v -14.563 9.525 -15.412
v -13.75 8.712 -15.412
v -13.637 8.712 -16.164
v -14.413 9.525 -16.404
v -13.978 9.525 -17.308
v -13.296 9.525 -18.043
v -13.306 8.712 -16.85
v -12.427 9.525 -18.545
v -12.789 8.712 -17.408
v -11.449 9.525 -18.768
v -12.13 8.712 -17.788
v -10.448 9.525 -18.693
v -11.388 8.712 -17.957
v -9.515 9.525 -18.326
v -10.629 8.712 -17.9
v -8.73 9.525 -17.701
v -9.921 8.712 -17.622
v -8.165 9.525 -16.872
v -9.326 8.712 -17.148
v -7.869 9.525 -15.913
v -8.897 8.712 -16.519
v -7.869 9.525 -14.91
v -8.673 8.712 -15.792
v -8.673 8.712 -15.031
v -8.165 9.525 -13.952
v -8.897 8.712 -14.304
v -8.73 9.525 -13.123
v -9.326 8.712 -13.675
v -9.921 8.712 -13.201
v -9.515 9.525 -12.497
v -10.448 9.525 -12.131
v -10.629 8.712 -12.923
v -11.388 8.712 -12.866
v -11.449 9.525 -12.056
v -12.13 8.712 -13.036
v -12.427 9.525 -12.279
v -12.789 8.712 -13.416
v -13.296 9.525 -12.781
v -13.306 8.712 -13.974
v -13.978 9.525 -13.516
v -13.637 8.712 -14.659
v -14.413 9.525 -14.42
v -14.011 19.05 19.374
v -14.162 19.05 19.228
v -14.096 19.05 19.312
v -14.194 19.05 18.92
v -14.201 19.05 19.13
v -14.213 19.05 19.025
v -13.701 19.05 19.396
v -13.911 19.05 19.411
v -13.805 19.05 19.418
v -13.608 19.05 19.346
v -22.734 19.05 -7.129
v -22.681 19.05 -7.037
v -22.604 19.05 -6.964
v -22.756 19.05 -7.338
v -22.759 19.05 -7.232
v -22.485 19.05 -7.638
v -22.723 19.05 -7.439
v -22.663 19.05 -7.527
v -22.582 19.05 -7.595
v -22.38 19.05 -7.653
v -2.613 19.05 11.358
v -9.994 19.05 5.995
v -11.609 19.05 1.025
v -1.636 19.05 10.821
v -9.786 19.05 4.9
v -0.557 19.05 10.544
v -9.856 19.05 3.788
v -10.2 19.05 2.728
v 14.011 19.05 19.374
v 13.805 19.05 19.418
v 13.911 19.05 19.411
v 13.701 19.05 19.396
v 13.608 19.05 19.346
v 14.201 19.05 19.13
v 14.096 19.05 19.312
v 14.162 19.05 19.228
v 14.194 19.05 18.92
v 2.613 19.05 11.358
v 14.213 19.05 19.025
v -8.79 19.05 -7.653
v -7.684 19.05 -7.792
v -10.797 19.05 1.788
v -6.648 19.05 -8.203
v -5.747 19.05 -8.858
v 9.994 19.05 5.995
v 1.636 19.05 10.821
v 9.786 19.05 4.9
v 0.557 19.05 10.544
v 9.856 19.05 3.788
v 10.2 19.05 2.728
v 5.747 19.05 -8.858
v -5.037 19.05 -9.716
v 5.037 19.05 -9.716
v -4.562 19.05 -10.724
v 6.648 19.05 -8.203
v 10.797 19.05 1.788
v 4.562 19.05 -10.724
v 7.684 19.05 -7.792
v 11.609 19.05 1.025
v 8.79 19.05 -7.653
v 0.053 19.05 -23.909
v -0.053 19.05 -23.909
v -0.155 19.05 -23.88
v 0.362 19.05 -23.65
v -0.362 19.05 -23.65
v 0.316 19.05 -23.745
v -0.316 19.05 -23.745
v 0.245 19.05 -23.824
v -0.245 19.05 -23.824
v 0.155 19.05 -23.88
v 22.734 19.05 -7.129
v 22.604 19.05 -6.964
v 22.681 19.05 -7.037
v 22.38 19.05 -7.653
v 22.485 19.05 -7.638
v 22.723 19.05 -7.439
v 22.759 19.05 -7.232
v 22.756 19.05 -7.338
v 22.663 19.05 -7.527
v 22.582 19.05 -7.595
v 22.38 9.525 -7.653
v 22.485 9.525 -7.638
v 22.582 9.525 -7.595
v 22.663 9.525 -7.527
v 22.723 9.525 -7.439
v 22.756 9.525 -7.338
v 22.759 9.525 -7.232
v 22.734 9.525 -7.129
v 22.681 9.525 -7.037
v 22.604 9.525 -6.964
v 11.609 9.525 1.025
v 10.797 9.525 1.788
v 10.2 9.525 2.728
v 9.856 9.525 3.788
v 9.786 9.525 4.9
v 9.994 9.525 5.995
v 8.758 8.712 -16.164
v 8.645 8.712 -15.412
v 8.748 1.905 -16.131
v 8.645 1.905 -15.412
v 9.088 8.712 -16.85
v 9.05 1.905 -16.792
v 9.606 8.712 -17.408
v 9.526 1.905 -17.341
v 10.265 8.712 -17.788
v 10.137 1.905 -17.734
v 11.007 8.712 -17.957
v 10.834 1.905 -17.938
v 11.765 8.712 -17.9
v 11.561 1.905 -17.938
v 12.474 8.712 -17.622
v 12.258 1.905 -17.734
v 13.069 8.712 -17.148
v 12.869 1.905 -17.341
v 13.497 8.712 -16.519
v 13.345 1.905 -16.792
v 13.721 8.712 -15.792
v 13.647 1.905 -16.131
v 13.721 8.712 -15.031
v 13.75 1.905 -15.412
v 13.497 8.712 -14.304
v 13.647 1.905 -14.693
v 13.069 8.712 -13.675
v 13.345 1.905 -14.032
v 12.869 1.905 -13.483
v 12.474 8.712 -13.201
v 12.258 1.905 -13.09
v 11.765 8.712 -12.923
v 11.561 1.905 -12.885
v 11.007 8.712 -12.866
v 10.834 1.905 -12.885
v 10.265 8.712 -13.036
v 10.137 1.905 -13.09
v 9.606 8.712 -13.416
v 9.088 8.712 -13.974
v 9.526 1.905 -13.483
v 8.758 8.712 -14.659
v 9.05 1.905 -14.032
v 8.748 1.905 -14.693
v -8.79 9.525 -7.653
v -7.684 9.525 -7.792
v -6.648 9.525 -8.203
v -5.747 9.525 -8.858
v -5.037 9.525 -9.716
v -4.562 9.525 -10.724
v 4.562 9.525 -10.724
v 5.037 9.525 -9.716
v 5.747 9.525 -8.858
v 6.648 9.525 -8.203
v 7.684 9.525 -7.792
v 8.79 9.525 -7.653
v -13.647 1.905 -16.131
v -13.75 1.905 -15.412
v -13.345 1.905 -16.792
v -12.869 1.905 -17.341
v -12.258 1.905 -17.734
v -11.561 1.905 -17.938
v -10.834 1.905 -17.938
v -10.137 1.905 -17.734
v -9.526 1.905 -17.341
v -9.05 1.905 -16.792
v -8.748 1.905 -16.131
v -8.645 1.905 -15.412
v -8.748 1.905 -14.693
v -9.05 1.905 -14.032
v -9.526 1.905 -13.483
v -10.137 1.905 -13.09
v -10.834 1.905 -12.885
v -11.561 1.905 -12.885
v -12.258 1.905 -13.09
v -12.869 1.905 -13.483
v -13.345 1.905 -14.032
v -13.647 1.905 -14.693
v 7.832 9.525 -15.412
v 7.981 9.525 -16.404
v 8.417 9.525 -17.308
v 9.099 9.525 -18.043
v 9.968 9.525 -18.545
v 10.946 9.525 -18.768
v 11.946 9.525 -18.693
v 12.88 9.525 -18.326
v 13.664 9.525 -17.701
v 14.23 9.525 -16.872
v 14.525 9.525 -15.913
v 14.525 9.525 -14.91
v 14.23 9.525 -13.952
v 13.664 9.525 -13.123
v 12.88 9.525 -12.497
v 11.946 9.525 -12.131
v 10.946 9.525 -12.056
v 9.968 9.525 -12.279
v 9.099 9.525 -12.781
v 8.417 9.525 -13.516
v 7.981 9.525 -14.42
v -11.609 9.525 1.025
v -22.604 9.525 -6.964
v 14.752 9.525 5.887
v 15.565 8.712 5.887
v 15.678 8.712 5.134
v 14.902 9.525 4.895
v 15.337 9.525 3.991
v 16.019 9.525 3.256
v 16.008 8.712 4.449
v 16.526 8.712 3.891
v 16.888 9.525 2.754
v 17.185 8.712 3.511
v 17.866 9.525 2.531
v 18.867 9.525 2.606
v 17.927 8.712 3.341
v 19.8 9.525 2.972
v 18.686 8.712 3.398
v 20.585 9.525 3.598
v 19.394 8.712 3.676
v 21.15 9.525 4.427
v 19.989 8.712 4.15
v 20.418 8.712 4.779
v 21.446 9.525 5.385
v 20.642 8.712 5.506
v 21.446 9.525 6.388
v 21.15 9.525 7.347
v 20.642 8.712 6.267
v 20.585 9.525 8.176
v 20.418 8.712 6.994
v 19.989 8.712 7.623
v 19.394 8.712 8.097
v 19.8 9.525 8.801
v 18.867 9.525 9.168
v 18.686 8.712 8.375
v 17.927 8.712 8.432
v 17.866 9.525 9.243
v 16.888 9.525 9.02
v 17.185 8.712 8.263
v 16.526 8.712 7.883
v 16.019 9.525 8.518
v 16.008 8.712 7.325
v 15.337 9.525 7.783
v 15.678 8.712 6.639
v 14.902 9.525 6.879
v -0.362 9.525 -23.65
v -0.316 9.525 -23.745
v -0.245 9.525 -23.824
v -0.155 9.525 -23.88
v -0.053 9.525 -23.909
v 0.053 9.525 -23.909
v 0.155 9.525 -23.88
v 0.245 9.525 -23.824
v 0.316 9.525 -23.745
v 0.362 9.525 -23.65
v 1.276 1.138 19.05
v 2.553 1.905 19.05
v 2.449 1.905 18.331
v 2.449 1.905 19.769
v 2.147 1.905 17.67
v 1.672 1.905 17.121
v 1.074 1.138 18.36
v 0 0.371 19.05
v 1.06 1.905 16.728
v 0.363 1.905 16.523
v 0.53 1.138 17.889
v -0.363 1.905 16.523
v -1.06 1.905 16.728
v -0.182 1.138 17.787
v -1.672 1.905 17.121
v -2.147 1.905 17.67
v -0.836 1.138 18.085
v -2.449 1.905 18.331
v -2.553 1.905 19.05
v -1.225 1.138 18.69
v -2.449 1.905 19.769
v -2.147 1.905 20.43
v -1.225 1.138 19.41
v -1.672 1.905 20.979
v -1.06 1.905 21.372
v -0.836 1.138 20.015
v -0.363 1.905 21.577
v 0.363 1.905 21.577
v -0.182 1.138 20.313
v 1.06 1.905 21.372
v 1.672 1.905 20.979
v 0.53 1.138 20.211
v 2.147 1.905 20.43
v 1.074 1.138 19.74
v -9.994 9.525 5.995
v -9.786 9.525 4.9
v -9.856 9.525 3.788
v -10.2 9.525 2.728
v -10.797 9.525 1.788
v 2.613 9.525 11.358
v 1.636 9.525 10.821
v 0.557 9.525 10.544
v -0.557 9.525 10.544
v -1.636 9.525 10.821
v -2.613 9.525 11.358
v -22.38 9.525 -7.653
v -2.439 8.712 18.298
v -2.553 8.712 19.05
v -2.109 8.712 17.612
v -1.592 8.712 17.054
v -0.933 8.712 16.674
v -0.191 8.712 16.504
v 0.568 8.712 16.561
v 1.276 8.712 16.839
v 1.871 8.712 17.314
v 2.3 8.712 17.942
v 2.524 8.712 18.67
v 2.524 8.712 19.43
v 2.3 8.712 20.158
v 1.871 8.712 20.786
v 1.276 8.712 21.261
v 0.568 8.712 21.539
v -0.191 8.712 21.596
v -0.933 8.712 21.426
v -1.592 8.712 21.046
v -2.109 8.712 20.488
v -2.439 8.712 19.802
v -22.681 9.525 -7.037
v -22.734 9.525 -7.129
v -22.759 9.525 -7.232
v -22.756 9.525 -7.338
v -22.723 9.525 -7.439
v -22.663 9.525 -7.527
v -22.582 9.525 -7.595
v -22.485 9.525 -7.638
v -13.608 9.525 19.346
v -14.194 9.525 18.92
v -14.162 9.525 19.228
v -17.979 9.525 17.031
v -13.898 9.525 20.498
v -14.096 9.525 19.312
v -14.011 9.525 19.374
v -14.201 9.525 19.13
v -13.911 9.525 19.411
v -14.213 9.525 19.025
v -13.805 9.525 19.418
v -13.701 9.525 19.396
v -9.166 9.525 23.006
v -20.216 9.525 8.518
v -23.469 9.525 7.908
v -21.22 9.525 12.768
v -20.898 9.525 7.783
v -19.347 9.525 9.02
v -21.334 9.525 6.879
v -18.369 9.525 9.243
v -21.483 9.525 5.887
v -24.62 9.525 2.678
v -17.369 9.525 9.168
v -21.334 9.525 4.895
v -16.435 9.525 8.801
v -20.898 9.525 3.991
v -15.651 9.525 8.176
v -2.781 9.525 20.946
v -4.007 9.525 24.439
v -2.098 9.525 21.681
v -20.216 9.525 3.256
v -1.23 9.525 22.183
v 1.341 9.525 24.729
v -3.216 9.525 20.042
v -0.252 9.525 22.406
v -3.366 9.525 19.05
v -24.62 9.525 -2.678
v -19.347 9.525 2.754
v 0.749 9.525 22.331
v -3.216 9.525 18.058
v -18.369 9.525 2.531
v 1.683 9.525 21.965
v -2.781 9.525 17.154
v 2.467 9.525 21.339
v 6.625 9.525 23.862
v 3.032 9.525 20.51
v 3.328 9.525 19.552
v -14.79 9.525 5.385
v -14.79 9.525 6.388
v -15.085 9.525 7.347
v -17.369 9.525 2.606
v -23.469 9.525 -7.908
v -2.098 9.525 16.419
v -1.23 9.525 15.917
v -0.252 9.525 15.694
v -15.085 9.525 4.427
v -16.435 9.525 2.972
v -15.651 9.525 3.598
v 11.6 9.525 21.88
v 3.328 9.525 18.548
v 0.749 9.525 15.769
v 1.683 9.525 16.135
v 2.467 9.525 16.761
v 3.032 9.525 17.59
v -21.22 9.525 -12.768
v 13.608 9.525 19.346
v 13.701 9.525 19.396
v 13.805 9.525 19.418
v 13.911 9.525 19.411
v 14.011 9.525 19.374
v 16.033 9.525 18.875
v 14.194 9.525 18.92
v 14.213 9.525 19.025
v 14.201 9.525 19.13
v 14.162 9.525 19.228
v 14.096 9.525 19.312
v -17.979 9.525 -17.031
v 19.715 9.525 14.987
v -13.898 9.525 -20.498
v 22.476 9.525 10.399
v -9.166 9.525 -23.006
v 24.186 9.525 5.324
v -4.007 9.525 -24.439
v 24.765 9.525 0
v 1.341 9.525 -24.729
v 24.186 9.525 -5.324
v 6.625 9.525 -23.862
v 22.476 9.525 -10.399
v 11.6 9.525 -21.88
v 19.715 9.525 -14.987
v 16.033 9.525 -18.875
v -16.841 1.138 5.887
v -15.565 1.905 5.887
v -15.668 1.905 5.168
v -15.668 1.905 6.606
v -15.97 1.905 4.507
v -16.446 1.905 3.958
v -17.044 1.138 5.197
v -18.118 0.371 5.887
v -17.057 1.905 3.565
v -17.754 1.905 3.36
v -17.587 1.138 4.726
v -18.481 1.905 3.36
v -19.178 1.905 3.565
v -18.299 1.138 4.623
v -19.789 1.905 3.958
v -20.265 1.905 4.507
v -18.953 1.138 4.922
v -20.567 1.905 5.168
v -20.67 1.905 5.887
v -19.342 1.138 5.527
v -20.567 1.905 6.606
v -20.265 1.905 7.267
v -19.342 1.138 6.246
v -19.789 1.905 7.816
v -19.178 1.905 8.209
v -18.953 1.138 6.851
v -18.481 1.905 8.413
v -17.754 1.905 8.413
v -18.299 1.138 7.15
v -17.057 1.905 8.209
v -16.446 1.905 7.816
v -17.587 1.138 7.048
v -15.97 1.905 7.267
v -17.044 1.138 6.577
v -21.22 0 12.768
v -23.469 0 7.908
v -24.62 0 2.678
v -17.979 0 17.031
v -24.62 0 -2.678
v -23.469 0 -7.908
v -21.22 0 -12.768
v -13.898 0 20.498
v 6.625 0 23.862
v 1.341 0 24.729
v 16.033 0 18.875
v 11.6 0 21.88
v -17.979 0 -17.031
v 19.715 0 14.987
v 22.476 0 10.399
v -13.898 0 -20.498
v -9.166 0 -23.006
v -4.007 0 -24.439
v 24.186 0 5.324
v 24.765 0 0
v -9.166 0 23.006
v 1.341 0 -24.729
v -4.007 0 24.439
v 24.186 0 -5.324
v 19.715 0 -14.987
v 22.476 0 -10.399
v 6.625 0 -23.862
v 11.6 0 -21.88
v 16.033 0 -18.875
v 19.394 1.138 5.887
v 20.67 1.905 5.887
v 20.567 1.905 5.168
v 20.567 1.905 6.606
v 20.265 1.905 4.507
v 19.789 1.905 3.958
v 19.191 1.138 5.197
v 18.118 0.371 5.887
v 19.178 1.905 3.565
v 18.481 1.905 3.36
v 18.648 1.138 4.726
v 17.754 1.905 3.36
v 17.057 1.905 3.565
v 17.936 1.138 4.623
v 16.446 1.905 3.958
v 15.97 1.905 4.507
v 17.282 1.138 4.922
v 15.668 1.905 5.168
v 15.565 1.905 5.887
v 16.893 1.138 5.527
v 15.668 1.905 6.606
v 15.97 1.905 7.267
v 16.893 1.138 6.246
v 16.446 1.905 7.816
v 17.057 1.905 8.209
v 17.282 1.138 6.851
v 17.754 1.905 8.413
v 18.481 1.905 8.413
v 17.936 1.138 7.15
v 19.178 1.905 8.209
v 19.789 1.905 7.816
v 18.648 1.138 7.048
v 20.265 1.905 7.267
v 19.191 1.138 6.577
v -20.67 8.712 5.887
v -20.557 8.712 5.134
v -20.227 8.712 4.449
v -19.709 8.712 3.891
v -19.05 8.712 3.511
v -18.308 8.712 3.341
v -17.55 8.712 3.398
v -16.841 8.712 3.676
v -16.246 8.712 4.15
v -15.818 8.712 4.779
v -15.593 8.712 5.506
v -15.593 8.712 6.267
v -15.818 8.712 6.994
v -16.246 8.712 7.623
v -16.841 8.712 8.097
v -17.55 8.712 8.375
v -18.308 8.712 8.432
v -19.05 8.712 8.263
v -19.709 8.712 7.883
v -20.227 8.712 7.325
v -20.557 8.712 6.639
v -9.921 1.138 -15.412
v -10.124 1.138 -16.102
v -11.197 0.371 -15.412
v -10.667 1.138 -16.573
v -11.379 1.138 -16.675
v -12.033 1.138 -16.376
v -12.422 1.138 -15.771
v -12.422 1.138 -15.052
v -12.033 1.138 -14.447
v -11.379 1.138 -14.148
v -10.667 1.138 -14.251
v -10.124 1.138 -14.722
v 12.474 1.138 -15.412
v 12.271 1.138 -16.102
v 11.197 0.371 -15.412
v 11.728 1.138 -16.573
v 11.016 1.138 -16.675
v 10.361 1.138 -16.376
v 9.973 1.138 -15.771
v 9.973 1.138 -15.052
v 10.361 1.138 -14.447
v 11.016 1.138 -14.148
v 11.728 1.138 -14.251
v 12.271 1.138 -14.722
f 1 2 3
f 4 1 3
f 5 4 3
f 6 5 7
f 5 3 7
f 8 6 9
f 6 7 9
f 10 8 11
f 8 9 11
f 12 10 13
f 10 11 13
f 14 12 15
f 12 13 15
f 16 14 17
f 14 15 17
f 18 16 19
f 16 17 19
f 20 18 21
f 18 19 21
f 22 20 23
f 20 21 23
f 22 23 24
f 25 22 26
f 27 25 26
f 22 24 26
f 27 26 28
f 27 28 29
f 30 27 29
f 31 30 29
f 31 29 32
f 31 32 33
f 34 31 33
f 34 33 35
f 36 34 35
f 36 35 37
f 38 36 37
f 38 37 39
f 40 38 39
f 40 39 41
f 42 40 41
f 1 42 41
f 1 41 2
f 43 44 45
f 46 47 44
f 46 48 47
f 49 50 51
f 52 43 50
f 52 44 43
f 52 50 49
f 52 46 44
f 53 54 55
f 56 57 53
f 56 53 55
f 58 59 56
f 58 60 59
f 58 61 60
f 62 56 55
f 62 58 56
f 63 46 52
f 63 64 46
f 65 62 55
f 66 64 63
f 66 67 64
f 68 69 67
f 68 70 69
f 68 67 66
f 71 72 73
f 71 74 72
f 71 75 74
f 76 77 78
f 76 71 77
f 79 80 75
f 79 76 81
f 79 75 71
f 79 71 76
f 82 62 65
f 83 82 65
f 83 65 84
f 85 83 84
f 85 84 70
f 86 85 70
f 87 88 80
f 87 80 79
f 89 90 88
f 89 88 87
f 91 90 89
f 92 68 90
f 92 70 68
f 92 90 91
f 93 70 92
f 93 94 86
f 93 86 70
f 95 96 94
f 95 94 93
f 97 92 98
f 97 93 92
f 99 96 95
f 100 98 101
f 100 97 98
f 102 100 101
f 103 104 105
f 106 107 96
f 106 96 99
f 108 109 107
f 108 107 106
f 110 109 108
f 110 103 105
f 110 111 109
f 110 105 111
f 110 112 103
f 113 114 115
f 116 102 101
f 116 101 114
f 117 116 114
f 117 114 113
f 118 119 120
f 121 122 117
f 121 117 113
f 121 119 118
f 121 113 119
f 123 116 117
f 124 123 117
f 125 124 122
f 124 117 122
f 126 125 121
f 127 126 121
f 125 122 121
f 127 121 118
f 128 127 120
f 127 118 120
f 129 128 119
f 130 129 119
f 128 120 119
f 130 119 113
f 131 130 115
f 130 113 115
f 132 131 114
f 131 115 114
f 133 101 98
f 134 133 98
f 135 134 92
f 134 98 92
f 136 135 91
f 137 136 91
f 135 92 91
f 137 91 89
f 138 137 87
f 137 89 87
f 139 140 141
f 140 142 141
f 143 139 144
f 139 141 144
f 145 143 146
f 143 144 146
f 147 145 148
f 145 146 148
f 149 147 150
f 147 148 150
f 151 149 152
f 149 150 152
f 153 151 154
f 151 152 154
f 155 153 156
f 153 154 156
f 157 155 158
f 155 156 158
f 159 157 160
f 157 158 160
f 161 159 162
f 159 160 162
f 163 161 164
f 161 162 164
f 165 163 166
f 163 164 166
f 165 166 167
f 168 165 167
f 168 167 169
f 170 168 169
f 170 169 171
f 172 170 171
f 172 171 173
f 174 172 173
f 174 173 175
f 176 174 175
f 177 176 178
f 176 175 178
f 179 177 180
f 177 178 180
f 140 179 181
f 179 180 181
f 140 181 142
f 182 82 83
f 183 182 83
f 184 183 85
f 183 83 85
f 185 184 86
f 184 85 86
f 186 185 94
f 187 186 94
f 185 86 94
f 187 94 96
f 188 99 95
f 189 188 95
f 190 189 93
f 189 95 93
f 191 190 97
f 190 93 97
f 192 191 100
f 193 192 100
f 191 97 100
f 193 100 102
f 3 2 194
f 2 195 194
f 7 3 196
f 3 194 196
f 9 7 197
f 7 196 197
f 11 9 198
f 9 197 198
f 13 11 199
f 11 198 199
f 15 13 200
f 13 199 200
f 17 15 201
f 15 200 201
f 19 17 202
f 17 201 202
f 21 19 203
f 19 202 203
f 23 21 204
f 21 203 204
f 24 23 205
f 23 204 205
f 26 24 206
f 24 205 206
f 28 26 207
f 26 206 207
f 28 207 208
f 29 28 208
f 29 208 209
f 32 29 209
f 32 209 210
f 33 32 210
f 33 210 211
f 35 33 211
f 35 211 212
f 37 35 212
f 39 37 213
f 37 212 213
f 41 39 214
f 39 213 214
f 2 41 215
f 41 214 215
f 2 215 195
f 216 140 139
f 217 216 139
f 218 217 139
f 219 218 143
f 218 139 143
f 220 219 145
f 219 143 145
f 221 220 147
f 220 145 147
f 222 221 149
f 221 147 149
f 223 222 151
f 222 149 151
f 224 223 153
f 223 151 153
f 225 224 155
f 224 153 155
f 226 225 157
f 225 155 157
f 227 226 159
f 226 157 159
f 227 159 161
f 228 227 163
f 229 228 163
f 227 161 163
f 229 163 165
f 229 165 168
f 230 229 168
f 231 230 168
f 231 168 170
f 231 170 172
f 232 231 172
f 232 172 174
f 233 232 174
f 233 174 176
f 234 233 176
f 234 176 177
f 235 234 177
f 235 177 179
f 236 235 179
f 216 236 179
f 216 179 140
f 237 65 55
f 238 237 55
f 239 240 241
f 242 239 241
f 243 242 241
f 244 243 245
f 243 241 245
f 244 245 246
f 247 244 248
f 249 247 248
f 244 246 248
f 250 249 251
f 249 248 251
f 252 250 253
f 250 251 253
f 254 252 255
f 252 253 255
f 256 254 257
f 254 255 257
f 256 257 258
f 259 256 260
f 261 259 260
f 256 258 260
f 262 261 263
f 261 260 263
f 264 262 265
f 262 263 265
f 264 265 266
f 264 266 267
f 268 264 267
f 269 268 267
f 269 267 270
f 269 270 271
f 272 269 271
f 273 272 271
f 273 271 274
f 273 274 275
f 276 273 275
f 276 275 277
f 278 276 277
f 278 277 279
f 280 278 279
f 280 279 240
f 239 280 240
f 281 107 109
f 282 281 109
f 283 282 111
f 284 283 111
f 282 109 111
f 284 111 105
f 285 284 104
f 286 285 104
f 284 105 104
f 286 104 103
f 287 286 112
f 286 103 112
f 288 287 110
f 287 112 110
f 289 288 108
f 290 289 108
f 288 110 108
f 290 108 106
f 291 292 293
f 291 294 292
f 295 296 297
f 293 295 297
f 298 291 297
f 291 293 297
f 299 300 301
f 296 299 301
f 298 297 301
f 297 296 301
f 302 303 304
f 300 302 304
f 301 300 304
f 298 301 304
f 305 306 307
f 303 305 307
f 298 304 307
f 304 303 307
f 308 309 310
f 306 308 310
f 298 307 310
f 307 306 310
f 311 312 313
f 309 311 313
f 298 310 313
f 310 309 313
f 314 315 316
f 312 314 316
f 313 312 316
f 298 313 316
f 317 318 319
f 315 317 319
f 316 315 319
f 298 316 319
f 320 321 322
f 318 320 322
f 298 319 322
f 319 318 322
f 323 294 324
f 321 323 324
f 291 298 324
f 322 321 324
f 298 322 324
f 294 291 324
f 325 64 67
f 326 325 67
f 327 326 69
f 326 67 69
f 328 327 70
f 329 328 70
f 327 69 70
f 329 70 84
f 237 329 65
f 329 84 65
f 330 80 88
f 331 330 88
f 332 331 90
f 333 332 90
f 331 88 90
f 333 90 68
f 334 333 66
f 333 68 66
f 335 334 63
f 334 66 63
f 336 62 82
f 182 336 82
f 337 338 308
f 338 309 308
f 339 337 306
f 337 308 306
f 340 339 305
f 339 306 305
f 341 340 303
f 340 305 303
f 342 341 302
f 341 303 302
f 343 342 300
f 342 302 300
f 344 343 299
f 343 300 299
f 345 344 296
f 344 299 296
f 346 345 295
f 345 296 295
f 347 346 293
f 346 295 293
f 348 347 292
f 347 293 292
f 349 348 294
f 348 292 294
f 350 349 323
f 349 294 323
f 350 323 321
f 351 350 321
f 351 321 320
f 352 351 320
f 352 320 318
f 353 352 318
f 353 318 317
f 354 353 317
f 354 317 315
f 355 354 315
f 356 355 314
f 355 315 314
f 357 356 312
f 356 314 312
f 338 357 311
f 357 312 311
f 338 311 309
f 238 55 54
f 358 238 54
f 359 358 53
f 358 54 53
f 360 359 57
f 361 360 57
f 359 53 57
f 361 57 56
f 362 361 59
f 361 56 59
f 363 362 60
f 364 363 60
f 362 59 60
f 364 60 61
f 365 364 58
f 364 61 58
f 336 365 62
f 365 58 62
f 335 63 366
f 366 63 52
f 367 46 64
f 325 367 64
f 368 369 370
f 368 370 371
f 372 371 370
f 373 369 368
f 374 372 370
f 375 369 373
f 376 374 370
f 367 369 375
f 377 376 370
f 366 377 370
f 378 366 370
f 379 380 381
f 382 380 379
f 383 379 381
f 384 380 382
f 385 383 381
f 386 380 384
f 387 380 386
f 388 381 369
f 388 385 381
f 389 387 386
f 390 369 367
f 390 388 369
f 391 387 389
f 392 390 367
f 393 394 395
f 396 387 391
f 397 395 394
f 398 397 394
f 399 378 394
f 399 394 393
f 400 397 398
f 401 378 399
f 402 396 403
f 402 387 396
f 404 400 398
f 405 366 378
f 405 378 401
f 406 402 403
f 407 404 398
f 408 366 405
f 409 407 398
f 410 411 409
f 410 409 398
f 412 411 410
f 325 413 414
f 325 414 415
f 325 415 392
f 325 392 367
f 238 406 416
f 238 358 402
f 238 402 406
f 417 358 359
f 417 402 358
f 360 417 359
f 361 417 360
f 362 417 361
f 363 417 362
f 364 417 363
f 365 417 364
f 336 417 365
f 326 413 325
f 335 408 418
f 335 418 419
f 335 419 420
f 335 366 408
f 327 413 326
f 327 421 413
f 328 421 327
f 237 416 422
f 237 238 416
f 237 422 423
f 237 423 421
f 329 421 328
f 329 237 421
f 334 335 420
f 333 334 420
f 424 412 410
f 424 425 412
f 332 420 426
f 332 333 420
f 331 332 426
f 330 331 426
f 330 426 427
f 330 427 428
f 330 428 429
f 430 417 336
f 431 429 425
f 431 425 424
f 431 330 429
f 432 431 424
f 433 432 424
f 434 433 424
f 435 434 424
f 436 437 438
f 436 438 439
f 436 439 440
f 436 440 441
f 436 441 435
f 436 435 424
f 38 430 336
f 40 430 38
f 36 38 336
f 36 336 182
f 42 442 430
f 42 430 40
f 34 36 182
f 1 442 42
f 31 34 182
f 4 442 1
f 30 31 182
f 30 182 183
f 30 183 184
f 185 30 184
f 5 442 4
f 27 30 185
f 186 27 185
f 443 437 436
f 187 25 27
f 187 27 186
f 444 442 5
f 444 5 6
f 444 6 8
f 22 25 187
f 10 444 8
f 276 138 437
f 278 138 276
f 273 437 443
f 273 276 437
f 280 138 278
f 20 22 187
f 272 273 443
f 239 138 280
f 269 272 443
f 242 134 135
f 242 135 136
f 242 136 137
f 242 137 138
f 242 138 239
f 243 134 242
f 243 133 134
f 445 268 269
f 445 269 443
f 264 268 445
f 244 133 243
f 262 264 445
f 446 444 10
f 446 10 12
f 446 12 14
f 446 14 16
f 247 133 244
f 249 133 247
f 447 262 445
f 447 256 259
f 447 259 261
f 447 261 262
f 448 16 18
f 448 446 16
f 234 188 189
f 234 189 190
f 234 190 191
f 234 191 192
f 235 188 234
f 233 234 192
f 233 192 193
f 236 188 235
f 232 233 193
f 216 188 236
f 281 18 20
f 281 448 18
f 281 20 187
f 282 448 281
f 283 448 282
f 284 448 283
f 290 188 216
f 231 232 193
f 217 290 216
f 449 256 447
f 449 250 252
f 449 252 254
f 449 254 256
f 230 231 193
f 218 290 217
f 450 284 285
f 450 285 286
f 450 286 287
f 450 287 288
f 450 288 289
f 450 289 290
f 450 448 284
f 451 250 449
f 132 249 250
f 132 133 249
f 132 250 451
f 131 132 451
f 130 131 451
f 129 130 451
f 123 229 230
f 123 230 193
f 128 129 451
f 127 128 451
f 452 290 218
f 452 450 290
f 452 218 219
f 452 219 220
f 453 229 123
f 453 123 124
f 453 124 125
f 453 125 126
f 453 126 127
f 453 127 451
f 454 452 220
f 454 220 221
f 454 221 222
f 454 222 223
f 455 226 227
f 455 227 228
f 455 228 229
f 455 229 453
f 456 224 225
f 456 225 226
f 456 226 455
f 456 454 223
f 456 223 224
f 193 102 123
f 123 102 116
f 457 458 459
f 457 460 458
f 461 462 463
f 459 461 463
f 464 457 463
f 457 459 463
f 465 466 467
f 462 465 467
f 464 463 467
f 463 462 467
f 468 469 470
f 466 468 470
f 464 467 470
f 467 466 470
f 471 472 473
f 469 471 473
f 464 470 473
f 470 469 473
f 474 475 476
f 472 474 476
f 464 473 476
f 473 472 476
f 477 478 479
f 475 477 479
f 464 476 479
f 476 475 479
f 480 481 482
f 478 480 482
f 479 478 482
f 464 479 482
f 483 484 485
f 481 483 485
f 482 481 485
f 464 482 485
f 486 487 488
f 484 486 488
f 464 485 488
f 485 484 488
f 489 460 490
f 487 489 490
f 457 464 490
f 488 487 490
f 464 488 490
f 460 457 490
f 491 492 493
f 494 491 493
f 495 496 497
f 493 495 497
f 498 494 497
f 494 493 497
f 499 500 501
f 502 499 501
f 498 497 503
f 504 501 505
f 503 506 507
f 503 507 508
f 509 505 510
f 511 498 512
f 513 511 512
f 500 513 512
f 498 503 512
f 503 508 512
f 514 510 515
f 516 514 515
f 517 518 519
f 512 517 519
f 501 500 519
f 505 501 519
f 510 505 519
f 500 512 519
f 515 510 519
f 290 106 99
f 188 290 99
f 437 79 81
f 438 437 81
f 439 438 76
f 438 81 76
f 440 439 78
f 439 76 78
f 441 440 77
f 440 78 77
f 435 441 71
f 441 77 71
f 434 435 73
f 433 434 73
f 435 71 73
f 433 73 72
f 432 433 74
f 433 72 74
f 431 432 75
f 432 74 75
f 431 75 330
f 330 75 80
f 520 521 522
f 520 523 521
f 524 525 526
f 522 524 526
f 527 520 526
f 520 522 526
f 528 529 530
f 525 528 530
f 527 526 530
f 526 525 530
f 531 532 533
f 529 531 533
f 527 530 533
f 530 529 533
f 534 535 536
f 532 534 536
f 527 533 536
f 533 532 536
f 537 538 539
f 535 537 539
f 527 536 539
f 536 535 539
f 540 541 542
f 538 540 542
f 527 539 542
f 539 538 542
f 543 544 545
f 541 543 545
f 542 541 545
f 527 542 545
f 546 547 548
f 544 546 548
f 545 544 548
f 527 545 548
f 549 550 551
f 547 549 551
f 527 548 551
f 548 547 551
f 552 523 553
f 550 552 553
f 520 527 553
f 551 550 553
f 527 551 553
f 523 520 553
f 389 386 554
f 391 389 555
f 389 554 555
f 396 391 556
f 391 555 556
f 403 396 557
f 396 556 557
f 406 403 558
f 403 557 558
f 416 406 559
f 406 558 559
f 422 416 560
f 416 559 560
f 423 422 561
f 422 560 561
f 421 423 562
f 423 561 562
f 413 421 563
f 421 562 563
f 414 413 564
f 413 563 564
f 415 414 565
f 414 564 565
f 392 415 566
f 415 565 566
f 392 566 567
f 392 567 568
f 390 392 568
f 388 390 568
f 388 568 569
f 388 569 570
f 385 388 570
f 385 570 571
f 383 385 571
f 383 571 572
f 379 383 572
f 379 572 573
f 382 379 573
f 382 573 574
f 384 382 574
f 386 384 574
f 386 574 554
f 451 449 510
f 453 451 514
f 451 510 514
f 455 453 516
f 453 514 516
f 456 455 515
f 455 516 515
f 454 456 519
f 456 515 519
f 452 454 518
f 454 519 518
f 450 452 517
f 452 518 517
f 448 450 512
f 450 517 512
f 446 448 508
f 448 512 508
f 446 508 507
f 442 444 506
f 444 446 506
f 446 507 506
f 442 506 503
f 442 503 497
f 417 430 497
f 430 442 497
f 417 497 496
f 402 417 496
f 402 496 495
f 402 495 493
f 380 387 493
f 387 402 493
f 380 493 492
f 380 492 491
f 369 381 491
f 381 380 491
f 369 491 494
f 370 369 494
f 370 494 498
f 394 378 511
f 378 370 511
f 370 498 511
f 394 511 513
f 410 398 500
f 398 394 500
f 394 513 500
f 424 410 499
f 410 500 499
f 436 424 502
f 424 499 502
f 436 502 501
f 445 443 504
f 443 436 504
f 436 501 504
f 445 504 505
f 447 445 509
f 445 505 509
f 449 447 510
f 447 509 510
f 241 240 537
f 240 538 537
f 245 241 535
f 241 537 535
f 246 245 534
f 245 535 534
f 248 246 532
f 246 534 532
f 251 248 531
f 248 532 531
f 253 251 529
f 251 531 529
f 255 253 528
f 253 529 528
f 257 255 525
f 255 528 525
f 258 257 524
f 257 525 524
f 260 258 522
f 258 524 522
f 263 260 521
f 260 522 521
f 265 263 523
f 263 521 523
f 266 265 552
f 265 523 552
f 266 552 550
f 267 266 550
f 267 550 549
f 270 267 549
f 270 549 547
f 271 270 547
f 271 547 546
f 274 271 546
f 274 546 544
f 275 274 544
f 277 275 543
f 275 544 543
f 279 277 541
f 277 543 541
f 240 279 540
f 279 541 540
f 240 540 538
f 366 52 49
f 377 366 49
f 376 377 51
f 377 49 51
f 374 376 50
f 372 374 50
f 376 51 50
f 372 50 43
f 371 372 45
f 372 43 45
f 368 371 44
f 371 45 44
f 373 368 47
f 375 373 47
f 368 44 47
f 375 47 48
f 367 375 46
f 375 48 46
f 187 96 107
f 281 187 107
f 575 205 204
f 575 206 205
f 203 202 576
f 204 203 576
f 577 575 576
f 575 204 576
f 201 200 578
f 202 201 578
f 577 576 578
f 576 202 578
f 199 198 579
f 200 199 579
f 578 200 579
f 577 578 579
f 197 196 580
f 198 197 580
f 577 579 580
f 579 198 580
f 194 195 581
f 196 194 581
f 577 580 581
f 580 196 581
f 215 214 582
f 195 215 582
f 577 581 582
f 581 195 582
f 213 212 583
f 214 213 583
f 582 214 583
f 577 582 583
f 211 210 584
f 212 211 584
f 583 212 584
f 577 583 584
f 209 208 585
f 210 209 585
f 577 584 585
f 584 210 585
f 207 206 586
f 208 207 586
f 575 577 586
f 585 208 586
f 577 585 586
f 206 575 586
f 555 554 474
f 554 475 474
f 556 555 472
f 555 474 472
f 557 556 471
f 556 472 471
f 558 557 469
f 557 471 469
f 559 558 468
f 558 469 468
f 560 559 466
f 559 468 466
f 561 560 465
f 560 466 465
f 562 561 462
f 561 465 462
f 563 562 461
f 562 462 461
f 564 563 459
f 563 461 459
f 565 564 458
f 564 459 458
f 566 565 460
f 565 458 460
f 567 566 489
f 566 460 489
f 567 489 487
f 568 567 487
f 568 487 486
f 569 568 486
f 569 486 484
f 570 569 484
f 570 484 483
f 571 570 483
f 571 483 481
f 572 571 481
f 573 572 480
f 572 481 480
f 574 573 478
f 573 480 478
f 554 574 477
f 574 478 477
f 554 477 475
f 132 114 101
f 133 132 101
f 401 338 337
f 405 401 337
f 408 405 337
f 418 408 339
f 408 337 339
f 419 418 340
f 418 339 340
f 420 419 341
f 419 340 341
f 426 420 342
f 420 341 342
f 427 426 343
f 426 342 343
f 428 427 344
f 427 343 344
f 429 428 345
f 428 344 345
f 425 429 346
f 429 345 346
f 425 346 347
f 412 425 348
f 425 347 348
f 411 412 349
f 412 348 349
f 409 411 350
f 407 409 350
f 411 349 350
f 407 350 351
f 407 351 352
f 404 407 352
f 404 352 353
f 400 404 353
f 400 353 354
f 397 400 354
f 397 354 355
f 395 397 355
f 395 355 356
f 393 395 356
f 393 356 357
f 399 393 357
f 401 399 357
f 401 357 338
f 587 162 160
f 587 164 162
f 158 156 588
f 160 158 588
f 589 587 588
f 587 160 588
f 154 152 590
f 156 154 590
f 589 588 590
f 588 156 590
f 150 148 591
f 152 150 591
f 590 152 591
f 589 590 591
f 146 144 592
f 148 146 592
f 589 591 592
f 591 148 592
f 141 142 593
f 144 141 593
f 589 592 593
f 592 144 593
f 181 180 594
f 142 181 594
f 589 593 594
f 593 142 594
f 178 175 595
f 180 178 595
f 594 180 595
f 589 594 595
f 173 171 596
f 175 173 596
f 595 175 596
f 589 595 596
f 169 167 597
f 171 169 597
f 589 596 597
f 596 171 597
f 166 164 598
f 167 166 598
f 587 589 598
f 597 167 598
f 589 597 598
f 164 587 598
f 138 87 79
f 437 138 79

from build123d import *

# Parameters (mm, degrees)
SKETCH1_R                         = 24.765
BOSS_EXTRUDE1_DEPTH               = 19.05
SKETCH2_OUTSIDE_W                 = 66.048
SKETCH2_OUTSIDE_H                 = 66.048
CUT_EXTRUDE1_DEPTH                = 9.525
F_1_4_20_TAPPED_HOLE5_D           = 5.1054
F_1_4_20_TAPPED_HOLE5_DEPTH       = 7.62
F_1_4_20_TAPPED_HOLE5_CSINK_D     = 6.731
F_1_4_20_TAPPED_HOLE5_CSINK_ANGLE = 90
F_1_4_20_TAPPED_HOLE5_TIP         = 1.533816902


with BuildPart() as part:
    # Sketch1 → Boss-Extrude1 (new body)
    with BuildSketch(Plane(origin=(0, 0, 0), x_dir=(1, 0, 0), z_dir=(0, 1, 0))):
        Circle(SKETCH1_R)
    extrude(amount=BOSS_EXTRUDE1_DEPTH)

    # Sketch2 outside → Cut-Extrude1 (cut)
    with BuildSketch(Plane(origin=(0, 19.05, 0), x_dir=(1, 0, 0), z_dir=(0, 1, 0))):
        Rectangle(SKETCH2_OUTSIDE_W, SKETCH2_OUTSIDE_H)
        with BuildLine():
            Line((-14.19414924, -18.920099441), (-9.994377531, -5.994531191))
            ThreePointArc((-9.994377531, -5.994531191), (-9.994377531, -3.247370111), (-11.609118299, -1.024870111))
            Line((-11.609118299, -1.024870111), (-22.60426338, 6.963570391))
            ThreePointArc((-22.60426338, 6.963570391), (-22.742669731, 7.389541341), (-22.380317198, 7.652805866))
            Line((-22.380317198, 7.652805866), (-8.789570457, 7.652805866))
            ThreePointArc((-8.789570457, 7.652805866), (-6.176865011, 8.501725326), (-4.562124242, 10.724225326))
            Line((-4.562124242, 10.724225326), (-0.362352533, 23.649793575))
            ThreePointArc((-0.362352533, 23.649793575), (0, 23.913058101), (0.362352533, 23.649793575))
            Line((0.362352533, 23.649793575), (4.562124242, 10.724225326))
            ThreePointArc((4.562124242, 10.724225326), (6.176865011, 8.501725326), (8.789570457, 7.652805866))
            Line((8.789570457, 7.652805866), (22.380317198, 7.652805866))
            ThreePointArc((22.380317198, 7.652805866), (22.742669731, 7.389541341), (22.60426338, 6.963570391))
            Line((22.60426338, 6.963570391), (11.609118299, -1.024870111))
            ThreePointArc((11.609118299, -1.024870111), (9.994377531, -3.247370111), (9.994377531, -5.994531191))
            Line((9.994377531, -5.994531191), (14.19414924, -18.920099441))
            ThreePointArc((14.19414924, -18.920099441), (14.055742889, -19.346070391), (13.607850526, -19.346070391))
            Line((13.607850526, -19.346070391), (2.612705446, -11.357629889))
            ThreePointArc((2.612705446, -11.357629889), (0, -10.508710429), (-2.612705446, -11.357629889))
            Line((-2.612705446, -11.357629889), (-13.607850526, -19.346070391))
            ThreePointArc((-13.607850526, -19.346070391), (-14.055742889, -19.346070391), (-14.19414924, -18.920099441))
        make_face(mode=Mode.SUBTRACT)
    extrude(amount=-CUT_EXTRUDE1_DEPTH, mode=Mode.SUBTRACT)

    # 1/4-20 Tapped Hole5
    with Locations(Plane(origin=(0, 9.525, 0), x_dir=(1, 0, 0), z_dir=(0, 1, 0))):
        with Locations((-18.117626635, -5.886773743), (-11.197309056, 15.411773743), (11.197309056, 15.411773743), (18.117626635, -5.886773743), (0, -19.05)):
            CounterSinkHole(F_1_4_20_TAPPED_HOLE5_D / 2, F_1_4_20_TAPPED_HOLE5_CSINK_D / 2, depth=F_1_4_20_TAPPED_HOLE5_DEPTH, counter_sink_angle=F_1_4_20_TAPPED_HOLE5_CSINK_ANGLE)
            with Locations((0, 0, -(F_1_4_20_TAPPED_HOLE5_DEPTH + F_1_4_20_TAPPED_HOLE5_TIP / 2))):  # 118° drill point
                Cone(0, F_1_4_20_TAPPED_HOLE5_D / 2, F_1_4_20_TAPPED_HOLE5_TIP, mode=Mode.SUBTRACT)


solid = part.part
